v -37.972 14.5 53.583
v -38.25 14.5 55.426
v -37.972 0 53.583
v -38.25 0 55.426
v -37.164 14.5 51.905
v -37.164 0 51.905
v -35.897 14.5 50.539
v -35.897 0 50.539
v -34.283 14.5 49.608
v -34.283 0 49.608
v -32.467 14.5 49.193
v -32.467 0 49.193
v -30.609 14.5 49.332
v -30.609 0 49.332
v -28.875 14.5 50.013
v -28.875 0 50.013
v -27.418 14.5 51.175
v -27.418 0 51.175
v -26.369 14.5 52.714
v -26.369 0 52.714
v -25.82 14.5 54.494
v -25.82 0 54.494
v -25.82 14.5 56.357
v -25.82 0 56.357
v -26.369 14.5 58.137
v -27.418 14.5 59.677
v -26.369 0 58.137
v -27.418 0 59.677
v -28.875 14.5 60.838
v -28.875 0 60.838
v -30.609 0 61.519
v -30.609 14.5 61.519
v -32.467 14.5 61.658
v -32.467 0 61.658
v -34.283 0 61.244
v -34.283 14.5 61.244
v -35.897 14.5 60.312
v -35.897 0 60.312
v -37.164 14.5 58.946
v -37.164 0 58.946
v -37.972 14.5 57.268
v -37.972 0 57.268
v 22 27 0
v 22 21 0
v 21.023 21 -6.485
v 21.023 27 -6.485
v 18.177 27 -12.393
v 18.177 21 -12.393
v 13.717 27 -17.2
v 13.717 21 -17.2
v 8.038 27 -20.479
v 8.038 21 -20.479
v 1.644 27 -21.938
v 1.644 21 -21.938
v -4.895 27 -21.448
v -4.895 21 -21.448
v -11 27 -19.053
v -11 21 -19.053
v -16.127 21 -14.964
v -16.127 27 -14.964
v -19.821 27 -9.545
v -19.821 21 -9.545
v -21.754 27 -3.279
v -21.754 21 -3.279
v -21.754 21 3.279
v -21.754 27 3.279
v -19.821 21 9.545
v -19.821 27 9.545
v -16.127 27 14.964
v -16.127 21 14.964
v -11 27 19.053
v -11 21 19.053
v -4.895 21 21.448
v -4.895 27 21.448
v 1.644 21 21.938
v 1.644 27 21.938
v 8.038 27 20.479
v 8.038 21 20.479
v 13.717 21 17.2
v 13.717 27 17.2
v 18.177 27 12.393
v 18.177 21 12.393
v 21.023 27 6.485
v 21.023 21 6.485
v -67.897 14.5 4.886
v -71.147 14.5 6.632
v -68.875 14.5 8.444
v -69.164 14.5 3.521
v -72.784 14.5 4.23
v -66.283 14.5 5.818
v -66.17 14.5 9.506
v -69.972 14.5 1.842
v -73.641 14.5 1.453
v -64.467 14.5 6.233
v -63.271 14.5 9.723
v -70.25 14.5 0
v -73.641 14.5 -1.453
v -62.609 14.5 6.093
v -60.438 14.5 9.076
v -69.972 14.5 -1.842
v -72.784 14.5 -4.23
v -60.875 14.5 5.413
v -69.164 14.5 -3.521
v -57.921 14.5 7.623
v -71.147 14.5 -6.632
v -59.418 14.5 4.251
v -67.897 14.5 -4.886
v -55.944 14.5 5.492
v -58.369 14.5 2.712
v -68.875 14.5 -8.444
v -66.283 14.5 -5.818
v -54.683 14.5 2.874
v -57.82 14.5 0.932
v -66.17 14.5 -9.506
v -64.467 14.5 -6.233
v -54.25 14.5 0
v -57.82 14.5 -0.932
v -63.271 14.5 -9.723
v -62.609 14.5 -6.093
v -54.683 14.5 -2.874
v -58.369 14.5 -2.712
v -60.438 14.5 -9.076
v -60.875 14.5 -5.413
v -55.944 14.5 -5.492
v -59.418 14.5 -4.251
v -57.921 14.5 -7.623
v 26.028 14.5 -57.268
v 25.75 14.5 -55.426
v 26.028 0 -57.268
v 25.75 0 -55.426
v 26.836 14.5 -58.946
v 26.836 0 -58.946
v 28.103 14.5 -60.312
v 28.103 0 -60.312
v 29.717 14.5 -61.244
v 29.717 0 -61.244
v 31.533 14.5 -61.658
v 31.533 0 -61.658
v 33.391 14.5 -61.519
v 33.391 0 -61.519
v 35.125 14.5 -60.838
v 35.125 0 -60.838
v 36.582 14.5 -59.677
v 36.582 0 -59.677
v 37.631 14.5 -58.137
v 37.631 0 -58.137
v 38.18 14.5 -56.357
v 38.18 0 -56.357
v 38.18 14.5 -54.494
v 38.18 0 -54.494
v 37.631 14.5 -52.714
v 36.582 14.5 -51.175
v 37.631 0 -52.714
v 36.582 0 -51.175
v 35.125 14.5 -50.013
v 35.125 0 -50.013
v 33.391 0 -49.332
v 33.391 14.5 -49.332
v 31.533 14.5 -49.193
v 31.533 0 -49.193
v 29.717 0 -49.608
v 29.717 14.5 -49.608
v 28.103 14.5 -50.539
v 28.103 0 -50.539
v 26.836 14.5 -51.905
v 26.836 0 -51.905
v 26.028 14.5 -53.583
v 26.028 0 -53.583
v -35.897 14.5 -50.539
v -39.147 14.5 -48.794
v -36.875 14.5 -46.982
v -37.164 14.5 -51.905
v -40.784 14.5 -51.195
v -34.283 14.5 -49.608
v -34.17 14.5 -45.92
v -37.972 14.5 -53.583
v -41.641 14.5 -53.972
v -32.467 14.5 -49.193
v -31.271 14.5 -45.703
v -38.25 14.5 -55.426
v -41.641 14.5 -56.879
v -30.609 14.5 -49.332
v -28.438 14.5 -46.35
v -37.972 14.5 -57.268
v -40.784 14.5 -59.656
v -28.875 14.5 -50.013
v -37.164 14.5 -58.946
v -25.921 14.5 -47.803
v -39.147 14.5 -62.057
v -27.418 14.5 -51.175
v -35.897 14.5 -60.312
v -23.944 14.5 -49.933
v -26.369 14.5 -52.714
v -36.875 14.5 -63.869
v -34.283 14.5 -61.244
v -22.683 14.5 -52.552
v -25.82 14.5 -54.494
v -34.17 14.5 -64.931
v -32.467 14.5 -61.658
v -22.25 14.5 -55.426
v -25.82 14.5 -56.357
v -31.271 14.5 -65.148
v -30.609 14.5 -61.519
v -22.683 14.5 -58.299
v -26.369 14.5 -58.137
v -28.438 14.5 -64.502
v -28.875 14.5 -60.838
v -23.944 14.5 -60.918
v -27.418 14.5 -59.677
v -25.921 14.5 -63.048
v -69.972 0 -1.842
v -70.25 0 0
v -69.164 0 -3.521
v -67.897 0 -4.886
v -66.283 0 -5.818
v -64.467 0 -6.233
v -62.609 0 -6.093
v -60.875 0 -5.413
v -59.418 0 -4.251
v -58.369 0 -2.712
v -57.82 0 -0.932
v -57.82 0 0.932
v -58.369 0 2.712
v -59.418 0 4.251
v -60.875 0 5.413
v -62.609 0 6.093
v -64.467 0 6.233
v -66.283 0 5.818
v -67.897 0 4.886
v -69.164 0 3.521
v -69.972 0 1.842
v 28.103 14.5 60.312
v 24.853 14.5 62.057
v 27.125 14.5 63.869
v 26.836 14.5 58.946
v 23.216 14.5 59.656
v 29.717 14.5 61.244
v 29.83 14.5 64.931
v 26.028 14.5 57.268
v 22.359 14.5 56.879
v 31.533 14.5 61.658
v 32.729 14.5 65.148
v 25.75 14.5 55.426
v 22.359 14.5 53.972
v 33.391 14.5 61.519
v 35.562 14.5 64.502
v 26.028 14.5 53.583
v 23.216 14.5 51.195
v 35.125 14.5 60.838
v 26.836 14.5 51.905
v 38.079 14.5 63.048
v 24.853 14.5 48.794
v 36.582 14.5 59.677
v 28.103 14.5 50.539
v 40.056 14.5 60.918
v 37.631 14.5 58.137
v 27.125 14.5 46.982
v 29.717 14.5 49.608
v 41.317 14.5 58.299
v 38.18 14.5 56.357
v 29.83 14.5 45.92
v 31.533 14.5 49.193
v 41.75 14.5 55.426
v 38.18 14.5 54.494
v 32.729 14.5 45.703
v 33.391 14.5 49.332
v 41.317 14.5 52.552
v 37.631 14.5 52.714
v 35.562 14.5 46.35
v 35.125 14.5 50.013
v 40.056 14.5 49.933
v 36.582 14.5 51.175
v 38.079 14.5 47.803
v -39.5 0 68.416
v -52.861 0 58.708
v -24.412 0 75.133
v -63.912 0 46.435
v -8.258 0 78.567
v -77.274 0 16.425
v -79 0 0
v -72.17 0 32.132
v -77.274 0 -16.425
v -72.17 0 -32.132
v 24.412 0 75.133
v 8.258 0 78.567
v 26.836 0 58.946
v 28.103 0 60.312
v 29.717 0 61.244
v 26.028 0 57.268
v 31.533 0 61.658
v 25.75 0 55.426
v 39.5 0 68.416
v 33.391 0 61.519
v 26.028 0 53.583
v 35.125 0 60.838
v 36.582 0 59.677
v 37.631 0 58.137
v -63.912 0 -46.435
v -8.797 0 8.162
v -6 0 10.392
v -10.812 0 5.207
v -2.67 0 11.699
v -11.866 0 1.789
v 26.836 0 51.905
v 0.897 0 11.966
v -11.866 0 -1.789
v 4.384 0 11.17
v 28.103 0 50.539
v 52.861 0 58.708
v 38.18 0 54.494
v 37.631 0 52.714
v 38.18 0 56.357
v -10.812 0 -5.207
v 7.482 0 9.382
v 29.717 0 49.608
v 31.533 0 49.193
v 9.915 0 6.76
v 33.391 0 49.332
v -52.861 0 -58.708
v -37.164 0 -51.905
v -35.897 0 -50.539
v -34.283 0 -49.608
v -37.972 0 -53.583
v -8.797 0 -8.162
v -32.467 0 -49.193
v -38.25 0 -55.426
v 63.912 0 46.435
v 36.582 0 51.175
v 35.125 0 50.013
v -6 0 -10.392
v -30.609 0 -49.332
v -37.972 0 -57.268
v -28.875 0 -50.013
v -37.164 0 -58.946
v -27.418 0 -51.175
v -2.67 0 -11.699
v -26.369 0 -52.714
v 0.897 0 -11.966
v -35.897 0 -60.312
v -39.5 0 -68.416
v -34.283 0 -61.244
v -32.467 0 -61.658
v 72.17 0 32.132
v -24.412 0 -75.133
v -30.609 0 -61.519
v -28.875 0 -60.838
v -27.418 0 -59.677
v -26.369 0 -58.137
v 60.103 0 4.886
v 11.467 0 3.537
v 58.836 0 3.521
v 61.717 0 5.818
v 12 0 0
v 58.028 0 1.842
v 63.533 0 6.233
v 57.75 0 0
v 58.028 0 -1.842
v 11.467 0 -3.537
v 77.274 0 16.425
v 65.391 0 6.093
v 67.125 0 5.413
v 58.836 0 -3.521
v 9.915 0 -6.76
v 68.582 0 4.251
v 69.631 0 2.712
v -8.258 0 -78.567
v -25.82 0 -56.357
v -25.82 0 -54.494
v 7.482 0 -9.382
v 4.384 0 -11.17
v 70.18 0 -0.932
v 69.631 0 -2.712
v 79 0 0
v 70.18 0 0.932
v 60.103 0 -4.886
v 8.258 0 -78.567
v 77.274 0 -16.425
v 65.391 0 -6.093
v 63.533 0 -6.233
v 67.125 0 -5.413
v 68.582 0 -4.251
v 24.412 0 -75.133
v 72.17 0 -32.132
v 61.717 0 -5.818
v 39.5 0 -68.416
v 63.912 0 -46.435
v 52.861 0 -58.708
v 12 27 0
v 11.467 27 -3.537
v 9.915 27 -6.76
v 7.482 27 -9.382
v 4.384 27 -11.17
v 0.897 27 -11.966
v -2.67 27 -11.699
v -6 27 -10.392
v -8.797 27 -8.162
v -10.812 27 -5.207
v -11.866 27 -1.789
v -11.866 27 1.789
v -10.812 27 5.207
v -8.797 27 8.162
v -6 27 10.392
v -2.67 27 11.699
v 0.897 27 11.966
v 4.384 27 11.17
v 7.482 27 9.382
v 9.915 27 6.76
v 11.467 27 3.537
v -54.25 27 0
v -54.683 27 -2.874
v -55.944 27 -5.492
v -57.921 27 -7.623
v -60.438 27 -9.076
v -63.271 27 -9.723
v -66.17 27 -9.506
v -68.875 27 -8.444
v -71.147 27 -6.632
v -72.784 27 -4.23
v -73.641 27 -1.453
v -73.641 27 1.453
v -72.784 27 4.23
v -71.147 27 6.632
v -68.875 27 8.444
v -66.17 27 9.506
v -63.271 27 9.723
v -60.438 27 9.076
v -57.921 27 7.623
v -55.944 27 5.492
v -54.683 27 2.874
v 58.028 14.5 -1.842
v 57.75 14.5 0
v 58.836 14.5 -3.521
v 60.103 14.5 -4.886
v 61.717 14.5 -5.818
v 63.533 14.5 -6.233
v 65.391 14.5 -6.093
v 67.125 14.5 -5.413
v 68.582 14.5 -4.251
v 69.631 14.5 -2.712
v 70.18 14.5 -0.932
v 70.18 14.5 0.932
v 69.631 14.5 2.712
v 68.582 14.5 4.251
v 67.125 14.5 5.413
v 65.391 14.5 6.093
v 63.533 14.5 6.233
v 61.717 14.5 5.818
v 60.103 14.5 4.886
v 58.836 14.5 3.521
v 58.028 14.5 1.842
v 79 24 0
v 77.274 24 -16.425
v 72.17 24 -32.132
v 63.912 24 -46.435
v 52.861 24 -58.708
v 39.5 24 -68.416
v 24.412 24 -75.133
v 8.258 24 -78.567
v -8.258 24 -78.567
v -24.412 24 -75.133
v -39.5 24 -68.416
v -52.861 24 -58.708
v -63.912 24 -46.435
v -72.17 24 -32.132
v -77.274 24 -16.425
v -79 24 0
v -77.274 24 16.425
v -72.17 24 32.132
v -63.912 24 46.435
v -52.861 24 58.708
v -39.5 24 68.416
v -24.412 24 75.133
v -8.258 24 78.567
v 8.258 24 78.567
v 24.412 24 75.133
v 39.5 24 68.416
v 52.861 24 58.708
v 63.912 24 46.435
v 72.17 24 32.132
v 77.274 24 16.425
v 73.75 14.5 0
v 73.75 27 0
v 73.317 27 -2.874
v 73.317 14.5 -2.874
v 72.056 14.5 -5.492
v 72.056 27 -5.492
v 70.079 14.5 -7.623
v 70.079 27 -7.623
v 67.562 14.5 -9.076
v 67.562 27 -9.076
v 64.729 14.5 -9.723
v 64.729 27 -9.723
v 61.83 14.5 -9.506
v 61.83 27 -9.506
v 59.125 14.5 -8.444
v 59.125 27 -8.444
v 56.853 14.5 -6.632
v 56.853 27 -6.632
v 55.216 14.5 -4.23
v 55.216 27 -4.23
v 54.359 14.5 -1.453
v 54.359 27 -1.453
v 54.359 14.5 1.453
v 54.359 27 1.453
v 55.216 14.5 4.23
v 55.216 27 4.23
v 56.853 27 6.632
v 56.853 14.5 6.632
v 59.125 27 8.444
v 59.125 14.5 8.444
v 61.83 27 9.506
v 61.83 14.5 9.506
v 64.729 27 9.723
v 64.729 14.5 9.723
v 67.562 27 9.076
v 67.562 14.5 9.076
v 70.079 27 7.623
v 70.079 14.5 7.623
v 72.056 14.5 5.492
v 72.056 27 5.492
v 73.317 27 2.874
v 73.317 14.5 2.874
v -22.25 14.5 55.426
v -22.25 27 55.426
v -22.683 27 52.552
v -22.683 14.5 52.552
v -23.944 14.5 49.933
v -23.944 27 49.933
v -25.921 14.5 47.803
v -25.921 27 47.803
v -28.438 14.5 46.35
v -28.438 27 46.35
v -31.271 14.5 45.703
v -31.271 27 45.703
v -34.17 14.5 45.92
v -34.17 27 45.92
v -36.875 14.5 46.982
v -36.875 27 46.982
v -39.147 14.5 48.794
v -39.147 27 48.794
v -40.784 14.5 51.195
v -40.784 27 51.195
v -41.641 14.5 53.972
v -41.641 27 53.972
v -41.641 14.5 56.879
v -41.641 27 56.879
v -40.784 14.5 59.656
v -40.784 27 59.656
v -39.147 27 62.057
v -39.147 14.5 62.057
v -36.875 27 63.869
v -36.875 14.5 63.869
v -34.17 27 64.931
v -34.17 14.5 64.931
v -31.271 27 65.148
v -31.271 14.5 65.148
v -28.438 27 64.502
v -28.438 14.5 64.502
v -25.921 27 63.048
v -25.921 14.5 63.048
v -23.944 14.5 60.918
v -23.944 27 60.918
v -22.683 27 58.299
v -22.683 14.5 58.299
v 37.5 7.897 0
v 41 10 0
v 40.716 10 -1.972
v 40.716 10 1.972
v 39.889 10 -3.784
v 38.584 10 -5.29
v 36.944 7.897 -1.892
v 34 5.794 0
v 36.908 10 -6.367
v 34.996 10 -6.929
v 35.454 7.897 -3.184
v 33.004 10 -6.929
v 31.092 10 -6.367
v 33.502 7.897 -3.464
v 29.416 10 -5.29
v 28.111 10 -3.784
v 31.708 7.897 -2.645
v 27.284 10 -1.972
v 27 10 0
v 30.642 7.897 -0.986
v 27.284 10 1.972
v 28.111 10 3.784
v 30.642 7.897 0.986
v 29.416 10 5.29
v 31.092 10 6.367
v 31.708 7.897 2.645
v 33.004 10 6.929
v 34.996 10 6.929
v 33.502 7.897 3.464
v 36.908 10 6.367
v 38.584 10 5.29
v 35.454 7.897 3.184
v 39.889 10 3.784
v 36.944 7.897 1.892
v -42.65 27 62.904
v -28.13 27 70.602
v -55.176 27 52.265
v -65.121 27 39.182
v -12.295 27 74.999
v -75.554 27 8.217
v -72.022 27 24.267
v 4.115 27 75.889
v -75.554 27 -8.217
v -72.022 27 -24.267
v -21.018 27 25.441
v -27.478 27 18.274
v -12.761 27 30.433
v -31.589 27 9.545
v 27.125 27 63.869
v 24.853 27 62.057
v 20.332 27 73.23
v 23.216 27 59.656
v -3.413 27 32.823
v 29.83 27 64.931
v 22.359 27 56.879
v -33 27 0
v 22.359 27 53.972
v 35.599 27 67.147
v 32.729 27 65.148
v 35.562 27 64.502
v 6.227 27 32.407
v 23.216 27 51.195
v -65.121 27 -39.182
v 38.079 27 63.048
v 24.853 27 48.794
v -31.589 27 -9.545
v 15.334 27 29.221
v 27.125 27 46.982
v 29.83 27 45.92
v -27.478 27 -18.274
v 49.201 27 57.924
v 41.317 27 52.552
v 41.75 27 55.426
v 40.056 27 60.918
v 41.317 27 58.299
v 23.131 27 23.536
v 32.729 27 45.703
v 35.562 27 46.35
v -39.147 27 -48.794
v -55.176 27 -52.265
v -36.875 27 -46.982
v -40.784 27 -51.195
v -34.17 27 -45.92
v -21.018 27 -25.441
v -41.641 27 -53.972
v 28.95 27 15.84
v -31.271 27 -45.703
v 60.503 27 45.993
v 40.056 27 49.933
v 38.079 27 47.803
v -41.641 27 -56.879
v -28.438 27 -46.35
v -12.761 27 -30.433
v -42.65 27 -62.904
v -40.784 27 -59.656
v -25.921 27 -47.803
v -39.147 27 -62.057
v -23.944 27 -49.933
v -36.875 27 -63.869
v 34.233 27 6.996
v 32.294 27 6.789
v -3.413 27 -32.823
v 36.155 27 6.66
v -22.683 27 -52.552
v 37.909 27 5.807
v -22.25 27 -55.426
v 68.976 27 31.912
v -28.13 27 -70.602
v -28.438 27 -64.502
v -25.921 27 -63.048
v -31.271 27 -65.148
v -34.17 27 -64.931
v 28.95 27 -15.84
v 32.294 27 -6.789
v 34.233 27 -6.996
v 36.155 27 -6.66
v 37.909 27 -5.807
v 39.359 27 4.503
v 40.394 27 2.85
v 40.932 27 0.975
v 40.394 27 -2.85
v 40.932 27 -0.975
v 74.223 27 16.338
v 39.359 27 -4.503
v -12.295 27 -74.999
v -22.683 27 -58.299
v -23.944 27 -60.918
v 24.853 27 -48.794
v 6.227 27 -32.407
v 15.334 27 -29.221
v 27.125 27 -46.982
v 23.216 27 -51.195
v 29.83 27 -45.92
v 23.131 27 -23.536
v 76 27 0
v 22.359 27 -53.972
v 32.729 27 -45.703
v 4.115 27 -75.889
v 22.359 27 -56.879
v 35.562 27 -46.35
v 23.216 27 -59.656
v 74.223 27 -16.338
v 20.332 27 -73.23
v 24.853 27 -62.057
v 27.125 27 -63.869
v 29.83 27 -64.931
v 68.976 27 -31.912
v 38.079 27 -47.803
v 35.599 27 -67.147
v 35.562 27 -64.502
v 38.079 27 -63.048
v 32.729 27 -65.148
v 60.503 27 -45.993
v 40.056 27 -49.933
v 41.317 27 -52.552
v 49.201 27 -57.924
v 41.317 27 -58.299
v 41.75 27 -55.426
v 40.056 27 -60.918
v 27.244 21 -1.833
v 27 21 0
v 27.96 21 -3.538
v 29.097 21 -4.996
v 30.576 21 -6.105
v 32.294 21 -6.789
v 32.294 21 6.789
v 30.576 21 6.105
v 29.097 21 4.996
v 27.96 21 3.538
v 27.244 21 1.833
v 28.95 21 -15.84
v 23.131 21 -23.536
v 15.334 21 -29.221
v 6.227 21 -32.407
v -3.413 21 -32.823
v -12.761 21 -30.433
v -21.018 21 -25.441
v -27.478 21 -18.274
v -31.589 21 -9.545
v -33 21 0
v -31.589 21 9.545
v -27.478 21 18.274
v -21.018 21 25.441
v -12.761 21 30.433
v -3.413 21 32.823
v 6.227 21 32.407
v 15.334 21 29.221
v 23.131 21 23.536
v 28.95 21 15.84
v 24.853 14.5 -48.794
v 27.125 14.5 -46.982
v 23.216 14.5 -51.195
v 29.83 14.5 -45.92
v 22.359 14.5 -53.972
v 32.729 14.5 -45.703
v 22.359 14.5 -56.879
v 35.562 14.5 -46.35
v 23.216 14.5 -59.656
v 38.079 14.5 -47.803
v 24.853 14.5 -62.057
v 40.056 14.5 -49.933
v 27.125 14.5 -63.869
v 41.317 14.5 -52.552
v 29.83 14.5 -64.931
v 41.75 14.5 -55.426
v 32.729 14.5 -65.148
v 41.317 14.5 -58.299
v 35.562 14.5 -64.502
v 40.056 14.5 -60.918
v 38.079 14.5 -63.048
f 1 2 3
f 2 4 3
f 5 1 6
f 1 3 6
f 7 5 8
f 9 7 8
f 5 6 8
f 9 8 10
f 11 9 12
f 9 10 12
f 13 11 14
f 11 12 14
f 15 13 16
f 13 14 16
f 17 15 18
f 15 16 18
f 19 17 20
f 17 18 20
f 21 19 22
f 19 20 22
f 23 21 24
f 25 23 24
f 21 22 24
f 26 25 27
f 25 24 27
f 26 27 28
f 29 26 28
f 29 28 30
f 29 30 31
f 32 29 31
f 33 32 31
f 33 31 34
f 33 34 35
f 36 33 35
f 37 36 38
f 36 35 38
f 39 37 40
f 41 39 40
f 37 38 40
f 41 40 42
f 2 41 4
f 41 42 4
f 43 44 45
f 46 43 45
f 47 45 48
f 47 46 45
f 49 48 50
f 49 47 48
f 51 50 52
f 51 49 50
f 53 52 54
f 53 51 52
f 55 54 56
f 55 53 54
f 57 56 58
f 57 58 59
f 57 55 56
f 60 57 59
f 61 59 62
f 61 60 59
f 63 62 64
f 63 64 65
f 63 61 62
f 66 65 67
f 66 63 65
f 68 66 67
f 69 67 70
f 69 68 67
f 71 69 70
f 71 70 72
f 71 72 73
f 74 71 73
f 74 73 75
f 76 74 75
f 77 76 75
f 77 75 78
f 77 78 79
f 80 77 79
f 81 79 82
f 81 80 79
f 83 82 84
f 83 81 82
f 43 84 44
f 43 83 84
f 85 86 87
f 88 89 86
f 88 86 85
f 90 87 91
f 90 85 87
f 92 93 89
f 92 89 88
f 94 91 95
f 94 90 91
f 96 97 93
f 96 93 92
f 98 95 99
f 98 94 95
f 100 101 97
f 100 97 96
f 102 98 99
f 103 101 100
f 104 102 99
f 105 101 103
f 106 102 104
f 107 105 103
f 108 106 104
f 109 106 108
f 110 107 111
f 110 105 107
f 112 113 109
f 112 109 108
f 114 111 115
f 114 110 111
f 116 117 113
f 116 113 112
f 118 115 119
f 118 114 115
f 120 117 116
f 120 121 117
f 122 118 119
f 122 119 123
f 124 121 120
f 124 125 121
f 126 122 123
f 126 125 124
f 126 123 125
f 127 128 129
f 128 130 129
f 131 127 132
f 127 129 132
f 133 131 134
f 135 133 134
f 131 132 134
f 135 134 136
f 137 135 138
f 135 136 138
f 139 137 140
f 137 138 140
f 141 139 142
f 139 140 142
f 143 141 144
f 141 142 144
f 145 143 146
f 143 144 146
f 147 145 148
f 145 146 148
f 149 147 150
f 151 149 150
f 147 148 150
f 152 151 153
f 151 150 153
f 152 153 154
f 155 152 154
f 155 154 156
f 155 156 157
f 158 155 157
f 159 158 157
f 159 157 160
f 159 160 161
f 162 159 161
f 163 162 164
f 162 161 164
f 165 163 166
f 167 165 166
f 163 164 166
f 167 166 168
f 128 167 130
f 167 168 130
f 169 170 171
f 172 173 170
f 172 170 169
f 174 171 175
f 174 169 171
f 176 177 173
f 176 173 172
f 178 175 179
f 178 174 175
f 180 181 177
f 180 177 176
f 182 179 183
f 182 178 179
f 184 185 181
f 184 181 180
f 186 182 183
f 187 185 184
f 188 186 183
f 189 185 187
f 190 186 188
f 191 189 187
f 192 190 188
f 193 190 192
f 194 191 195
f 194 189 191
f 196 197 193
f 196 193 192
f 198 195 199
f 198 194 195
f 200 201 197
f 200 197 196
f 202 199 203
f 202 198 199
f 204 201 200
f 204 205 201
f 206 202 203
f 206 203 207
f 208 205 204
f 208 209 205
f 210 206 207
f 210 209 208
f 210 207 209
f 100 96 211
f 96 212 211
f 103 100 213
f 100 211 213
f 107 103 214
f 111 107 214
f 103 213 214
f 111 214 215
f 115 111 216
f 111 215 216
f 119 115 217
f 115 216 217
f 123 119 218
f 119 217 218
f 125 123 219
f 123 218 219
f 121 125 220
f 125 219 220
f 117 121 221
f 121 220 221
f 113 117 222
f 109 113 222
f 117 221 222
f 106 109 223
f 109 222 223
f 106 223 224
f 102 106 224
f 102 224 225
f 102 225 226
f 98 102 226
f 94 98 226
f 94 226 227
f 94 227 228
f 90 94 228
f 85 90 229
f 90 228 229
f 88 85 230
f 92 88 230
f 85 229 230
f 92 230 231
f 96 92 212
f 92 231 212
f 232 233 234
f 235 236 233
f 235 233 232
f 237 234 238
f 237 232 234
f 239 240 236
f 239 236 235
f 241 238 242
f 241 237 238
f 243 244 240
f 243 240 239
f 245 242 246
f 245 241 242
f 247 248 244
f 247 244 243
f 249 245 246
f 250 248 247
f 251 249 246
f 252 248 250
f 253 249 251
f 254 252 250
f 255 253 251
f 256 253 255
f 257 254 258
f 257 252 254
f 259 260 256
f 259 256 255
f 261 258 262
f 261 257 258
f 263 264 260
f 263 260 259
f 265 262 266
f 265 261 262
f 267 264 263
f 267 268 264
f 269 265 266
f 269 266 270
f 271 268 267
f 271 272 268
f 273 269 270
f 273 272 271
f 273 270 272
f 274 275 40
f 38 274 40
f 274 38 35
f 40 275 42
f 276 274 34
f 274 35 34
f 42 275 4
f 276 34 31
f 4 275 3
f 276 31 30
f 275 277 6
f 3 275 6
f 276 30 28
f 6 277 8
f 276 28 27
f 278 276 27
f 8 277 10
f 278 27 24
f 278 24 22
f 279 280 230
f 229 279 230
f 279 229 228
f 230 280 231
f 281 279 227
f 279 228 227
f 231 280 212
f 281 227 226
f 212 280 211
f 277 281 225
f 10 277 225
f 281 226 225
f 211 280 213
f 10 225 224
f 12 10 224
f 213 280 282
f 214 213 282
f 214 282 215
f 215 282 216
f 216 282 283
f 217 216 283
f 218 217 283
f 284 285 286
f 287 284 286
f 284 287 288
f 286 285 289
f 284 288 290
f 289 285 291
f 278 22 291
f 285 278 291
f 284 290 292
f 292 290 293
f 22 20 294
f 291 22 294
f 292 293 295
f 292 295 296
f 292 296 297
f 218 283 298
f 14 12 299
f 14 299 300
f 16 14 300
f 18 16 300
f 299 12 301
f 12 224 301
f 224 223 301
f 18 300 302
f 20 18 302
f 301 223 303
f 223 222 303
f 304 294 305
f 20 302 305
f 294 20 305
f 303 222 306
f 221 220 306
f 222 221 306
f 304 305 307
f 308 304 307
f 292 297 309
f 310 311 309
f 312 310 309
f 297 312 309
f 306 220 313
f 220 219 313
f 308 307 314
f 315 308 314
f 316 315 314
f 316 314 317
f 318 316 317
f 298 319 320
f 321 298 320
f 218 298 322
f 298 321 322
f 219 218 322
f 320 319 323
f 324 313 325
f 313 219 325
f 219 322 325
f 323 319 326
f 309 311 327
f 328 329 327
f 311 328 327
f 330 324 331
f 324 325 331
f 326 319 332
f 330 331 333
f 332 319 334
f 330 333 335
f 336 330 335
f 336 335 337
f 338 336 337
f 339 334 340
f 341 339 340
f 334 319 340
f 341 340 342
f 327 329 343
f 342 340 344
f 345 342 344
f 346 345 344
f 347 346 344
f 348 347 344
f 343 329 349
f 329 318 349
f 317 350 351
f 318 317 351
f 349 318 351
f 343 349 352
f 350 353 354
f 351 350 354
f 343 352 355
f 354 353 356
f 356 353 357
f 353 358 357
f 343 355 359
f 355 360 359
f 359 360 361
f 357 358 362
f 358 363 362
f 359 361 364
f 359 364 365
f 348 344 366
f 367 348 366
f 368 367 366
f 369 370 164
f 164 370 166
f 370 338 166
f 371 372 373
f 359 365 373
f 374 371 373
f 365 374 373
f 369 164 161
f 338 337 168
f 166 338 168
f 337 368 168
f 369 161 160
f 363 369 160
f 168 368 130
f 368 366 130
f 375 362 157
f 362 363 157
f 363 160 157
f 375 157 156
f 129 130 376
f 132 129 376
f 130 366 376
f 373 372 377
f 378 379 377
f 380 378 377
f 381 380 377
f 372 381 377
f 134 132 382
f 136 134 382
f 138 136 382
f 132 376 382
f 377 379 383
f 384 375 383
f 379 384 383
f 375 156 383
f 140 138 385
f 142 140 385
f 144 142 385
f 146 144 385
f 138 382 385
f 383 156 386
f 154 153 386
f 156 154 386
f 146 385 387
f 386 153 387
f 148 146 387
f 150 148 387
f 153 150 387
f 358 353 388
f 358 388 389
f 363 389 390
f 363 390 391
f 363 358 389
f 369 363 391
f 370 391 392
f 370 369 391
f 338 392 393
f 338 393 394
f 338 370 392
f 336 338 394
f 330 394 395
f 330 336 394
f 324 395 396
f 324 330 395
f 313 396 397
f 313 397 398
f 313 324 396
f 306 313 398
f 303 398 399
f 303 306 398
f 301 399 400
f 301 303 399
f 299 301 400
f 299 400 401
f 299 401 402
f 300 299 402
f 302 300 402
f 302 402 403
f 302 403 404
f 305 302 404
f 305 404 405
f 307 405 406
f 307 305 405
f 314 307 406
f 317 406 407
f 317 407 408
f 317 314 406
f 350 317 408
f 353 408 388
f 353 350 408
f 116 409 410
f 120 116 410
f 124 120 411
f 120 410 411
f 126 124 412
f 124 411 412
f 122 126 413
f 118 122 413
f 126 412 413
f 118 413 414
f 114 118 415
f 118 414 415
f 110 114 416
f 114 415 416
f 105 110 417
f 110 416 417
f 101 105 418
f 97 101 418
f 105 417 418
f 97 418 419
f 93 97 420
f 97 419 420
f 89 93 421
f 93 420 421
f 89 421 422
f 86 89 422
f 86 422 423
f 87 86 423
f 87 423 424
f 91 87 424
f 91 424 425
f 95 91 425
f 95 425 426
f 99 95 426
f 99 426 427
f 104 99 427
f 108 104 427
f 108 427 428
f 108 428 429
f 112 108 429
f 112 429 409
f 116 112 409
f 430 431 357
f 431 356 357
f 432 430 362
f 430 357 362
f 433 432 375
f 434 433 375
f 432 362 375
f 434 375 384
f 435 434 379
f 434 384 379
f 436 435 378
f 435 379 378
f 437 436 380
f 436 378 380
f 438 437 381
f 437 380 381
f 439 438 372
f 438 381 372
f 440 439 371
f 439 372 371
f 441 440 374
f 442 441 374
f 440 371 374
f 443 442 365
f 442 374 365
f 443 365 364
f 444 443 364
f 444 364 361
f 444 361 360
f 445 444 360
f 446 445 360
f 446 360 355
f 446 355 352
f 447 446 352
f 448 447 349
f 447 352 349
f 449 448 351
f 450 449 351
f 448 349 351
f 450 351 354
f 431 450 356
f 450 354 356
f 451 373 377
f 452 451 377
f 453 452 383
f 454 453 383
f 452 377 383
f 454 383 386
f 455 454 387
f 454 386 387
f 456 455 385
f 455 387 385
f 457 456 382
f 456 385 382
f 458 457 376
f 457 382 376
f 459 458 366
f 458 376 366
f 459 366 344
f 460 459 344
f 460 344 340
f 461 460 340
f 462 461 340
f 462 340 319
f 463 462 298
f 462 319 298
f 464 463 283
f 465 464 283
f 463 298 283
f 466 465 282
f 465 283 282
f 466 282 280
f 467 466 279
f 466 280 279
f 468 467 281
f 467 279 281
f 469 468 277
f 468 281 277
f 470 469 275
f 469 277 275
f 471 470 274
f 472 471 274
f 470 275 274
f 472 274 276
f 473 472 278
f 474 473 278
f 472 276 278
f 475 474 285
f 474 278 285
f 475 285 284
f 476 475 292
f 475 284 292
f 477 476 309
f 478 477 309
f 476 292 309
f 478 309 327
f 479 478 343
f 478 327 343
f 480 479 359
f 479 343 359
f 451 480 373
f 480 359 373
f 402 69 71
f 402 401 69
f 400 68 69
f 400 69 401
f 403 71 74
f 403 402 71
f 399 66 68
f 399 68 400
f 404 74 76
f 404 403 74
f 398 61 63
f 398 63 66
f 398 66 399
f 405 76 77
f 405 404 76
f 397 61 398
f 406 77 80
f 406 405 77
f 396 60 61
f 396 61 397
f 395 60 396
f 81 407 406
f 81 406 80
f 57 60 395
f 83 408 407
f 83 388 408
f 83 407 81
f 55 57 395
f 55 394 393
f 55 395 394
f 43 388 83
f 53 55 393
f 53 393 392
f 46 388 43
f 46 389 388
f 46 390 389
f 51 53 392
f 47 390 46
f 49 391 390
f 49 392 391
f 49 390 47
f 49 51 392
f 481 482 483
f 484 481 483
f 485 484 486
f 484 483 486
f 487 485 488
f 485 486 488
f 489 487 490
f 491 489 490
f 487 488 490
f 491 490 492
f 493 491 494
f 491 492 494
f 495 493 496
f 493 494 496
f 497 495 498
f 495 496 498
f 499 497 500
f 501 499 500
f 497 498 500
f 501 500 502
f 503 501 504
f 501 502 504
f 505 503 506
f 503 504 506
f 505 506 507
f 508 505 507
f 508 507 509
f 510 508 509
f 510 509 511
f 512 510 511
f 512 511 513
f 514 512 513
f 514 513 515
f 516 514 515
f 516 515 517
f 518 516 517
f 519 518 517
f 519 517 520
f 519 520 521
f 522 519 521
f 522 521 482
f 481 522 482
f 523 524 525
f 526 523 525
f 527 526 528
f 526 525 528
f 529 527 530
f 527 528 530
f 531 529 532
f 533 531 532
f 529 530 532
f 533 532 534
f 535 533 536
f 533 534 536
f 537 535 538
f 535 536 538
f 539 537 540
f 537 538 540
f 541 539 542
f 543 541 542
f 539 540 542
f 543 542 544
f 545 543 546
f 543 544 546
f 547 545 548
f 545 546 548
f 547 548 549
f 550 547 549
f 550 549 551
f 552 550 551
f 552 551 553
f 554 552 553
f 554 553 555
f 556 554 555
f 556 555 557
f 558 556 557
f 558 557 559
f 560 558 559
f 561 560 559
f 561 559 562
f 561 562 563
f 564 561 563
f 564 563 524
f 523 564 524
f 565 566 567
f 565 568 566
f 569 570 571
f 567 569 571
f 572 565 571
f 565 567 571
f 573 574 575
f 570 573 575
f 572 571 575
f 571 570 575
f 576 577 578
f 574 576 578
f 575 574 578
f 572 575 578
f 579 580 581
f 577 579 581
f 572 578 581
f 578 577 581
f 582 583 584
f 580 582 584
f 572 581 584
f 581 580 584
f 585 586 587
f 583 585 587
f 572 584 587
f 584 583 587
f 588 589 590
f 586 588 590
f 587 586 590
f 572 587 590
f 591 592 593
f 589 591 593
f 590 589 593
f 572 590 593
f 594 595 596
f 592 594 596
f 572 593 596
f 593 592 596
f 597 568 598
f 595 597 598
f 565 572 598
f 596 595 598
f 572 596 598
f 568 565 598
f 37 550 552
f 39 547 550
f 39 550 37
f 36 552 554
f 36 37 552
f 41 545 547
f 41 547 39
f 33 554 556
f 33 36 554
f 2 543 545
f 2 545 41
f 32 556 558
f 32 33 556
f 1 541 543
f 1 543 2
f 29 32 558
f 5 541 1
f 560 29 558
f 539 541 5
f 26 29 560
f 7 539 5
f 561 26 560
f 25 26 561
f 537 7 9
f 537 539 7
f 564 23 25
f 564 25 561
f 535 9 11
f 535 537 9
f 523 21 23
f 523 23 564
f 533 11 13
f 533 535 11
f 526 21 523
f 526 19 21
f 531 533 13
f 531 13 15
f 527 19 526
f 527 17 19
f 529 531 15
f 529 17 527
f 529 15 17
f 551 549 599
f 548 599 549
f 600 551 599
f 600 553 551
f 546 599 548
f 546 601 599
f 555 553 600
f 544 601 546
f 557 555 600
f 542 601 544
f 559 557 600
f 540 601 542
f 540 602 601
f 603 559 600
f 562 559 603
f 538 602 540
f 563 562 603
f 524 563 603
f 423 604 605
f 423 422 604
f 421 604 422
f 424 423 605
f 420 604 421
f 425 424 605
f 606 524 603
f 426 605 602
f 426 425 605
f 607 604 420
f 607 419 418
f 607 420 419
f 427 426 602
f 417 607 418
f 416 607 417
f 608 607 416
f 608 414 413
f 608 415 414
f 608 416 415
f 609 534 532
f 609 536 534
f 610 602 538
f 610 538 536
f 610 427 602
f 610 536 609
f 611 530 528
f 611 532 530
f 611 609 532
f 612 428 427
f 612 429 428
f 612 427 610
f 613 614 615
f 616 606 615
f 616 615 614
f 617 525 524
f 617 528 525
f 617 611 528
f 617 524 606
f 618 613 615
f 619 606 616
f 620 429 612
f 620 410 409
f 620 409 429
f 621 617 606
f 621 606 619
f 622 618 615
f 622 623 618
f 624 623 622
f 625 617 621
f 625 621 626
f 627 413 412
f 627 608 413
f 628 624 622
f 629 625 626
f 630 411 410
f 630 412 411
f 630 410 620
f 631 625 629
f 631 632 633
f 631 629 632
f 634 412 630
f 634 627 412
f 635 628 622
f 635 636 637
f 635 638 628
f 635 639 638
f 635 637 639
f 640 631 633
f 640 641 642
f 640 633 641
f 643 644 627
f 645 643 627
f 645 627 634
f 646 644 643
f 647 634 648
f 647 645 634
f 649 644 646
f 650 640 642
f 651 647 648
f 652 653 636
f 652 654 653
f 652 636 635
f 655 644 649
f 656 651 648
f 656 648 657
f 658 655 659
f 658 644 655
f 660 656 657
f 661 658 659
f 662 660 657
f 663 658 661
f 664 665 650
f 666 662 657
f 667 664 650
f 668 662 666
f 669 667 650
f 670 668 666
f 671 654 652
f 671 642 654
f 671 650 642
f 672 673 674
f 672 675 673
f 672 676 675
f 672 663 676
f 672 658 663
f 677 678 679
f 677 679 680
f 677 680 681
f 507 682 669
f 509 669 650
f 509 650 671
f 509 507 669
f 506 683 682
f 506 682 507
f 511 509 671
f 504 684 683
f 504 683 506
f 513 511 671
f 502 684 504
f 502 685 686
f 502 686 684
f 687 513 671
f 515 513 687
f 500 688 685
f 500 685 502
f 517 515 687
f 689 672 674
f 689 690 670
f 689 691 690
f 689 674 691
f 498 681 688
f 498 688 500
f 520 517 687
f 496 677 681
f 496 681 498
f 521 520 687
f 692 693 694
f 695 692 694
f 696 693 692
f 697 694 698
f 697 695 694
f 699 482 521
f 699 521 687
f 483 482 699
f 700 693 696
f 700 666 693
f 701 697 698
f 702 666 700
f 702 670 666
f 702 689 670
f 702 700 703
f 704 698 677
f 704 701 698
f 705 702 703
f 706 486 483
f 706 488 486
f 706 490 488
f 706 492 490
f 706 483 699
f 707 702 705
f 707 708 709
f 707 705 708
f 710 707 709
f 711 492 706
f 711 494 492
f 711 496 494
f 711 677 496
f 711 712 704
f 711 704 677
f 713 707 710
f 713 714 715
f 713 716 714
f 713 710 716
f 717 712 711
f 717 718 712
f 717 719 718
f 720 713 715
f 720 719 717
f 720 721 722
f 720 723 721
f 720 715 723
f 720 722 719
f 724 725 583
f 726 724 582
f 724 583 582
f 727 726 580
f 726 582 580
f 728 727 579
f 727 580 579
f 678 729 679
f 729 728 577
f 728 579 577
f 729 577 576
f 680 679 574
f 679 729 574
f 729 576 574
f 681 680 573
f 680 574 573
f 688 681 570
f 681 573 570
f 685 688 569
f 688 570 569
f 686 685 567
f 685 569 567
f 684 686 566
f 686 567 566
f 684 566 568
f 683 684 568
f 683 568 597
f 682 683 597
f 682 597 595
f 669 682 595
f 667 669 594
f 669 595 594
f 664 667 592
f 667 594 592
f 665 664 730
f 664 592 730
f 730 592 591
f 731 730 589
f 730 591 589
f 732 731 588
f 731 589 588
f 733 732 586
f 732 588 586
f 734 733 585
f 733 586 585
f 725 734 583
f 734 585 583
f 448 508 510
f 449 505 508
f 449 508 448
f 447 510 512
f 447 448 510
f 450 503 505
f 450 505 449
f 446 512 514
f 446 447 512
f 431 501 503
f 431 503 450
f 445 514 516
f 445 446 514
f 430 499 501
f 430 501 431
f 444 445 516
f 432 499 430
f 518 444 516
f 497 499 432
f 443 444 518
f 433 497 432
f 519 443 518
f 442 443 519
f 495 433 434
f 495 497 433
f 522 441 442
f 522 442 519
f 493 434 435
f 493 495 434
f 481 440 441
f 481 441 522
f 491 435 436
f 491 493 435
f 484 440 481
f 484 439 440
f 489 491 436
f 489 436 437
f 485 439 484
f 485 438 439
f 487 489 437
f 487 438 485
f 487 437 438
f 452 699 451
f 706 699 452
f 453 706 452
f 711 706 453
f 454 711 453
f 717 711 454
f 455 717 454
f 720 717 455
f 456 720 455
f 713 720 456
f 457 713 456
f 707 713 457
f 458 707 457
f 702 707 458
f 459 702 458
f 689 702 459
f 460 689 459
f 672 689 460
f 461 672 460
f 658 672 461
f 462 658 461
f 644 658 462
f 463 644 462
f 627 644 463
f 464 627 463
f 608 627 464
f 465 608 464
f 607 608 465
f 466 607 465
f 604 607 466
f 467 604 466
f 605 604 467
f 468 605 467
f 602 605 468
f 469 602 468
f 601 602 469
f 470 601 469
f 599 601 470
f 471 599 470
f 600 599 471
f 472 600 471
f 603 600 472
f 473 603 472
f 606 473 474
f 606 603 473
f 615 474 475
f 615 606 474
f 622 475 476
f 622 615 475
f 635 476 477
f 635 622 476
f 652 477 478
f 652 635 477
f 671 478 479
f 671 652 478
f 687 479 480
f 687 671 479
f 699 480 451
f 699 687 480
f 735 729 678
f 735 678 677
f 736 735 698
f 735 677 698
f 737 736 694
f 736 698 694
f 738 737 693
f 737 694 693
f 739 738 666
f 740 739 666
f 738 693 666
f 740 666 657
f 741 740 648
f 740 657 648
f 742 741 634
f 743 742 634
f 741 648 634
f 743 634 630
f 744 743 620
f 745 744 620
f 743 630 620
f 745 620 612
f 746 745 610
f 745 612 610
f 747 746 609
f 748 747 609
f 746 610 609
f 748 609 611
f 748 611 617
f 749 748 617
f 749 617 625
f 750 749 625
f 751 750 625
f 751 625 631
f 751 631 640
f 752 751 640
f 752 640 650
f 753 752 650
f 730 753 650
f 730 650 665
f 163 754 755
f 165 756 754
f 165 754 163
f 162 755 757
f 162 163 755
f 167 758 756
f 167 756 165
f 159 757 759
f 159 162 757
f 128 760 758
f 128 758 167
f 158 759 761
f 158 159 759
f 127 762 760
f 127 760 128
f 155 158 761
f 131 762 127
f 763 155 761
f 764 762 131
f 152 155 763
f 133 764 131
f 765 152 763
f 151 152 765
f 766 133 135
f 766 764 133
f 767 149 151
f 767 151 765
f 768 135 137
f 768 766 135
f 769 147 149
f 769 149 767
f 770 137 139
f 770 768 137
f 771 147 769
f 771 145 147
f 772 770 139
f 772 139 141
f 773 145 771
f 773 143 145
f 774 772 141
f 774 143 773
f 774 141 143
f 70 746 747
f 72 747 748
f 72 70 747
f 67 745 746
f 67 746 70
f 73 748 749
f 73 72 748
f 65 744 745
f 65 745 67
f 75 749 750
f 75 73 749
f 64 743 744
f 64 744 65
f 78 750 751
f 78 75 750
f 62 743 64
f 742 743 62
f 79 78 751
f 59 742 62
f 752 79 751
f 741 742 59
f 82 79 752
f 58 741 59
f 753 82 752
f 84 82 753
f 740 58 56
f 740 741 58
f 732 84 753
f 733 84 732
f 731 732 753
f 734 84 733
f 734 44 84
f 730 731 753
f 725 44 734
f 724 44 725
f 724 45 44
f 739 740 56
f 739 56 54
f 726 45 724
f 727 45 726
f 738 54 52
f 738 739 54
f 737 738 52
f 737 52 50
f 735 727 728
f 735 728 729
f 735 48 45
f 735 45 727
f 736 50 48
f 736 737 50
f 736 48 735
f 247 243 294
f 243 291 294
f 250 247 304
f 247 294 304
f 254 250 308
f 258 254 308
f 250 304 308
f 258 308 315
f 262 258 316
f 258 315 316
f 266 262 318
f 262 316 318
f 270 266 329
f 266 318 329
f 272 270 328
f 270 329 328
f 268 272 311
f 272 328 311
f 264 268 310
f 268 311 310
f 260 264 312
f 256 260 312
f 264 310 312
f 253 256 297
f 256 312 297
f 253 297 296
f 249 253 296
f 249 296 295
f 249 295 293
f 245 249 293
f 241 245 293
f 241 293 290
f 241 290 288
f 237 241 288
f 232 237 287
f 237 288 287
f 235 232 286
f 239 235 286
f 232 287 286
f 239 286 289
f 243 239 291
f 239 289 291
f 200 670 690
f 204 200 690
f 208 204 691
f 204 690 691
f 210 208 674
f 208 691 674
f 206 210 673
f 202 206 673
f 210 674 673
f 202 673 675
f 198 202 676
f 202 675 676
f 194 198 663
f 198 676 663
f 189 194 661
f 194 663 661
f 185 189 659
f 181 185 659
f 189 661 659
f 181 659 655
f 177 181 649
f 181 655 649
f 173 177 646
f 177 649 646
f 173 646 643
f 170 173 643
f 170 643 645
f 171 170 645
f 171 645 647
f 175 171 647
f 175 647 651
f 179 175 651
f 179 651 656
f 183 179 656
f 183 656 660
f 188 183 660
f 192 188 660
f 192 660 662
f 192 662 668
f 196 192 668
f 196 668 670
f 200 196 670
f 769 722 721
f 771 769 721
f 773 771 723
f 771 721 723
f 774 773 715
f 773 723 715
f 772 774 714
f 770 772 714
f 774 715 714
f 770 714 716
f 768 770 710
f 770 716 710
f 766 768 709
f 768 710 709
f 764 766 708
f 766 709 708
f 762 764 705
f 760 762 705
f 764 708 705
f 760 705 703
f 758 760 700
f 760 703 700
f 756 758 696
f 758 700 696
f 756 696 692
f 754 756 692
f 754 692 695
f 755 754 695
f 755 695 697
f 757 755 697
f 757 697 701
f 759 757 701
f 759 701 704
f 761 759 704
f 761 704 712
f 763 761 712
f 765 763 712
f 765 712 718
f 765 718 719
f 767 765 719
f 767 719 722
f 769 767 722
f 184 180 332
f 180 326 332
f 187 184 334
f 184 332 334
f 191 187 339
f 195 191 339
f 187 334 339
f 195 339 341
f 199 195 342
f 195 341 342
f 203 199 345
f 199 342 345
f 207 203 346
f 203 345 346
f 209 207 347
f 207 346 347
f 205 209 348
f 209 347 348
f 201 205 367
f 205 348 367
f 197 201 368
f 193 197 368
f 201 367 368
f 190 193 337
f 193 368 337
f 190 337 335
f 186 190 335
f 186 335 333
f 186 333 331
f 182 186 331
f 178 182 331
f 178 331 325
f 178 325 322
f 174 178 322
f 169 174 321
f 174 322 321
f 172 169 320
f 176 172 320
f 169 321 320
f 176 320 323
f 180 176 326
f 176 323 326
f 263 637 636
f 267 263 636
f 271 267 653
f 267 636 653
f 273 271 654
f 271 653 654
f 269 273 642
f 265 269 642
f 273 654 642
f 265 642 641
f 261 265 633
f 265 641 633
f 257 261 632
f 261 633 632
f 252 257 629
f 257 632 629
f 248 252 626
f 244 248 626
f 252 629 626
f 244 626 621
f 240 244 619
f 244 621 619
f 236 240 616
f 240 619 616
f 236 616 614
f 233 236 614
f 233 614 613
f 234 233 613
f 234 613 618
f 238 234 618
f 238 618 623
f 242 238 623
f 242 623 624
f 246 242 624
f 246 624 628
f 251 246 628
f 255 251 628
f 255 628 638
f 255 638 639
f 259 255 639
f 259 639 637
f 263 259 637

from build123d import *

# Parameters (mm, degrees)
SKETCH1_R                                           = 79
SKETCH1_R_2                                         = 12
BOSS_EXTRUDE3_DEPTH                                 = 27
CBORE_FOR_00_BINDING_HEAD_MACHINE_SCREW_D           = 12.499999892
CBORE_FOR_00_BINDING_HEAD_MACHINE_SCREW_CBORE_D     = 19.500000116
CBORE_FOR_00_BINDING_HEAD_MACHINE_SCREW_CBORE_DEPTH = 12.499999892
F_97_0_0059_DIAMETER_HOLE1_D                        = 13.99999994
F_97_0_0059_DIAMETER_HOLE1_DEPTH                    = 17
F_97_0_0059_DIAMETER_HOLE1_TIP                      = 4.206024315
SKETCH8_R                                           = 33
SKETCH8_R_2                                         = 22
CUT_EXTRUDE1_DEPTH                                  = 6
CHAMFER1_SIZE                                       = 3


with BuildPart() as part:
    # Sketch1 → Boss-Extrude3 (new body)
    with BuildSketch(Plane(origin=(0, 0, 0), x_dir=(1, 0, 0), z_dir=(0, 1, 0))):
        Circle(SKETCH1_R)
        Circle(SKETCH1_R_2, mode=Mode.SUBTRACT)
    extrude(amount=BOSS_EXTRUDE3_DEPTH)

    # CBORE for #00 Binding Head Machine Screw1 (through all)
    with Locations(Plane(origin=(0, 27, 0), x_dir=(1, 0, 0), z_dir=(0, 1, 0))):
        with Locations((32, 55.425625842), (64, 0), (32, -55.425625842), (-32, -55.425625842), (-64, 0), (-32, 55.425625842), (0, 0)):
            CounterBoreHole(CBORE_FOR_00_BINDING_HEAD_MACHINE_SCREW_D / 2, CBORE_FOR_00_BINDING_HEAD_MACHINE_SCREW_CBORE_D / 2, CBORE_FOR_00_BINDING_HEAD_MACHINE_SCREW_CBORE_DEPTH)

    # #97 (0.0059) Diameter Hole1
    with Locations(Plane(origin=(0, 27, 0), x_dir=(1, 0, 0), z_dir=(0, 1, 0))):
        with Locations((34, 0)):
            Hole(F_97_0_0059_DIAMETER_HOLE1_D / 2, depth=F_97_0_0059_DIAMETER_HOLE1_DEPTH)
            with Locations((0, 0, -(F_97_0_0059_DIAMETER_HOLE1_DEPTH + F_97_0_0059_DIAMETER_HOLE1_TIP / 2))):  # 118° drill point
                Cone(0, F_97_0_0059_DIAMETER_HOLE1_D / 2, F_97_0_0059_DIAMETER_HOLE1_TIP, mode=Mode.SUBTRACT)

    # Sketch8 → Cut-Extrude1 (cut)
    with BuildSketch(Plane(origin=(0, 27, 0), x_dir=(1, 0, 0), z_dir=(0, 1, 0))):
        Circle(SKETCH8_R)
        Circle(SKETCH8_R_2, mode=Mode.SUBTRACT)
    extrude(amount=-CUT_EXTRUDE1_DEPTH, mode=Mode.SUBTRACT)

    # Chamfer1
    chamfer1_edges = [part.edges().sort_by_distance(p)[0] for p in [
        (-79, 27, 0),
    ]]
    chamfer(chamfer1_edges, length=CHAMFER1_SIZE)


solid = part.part
